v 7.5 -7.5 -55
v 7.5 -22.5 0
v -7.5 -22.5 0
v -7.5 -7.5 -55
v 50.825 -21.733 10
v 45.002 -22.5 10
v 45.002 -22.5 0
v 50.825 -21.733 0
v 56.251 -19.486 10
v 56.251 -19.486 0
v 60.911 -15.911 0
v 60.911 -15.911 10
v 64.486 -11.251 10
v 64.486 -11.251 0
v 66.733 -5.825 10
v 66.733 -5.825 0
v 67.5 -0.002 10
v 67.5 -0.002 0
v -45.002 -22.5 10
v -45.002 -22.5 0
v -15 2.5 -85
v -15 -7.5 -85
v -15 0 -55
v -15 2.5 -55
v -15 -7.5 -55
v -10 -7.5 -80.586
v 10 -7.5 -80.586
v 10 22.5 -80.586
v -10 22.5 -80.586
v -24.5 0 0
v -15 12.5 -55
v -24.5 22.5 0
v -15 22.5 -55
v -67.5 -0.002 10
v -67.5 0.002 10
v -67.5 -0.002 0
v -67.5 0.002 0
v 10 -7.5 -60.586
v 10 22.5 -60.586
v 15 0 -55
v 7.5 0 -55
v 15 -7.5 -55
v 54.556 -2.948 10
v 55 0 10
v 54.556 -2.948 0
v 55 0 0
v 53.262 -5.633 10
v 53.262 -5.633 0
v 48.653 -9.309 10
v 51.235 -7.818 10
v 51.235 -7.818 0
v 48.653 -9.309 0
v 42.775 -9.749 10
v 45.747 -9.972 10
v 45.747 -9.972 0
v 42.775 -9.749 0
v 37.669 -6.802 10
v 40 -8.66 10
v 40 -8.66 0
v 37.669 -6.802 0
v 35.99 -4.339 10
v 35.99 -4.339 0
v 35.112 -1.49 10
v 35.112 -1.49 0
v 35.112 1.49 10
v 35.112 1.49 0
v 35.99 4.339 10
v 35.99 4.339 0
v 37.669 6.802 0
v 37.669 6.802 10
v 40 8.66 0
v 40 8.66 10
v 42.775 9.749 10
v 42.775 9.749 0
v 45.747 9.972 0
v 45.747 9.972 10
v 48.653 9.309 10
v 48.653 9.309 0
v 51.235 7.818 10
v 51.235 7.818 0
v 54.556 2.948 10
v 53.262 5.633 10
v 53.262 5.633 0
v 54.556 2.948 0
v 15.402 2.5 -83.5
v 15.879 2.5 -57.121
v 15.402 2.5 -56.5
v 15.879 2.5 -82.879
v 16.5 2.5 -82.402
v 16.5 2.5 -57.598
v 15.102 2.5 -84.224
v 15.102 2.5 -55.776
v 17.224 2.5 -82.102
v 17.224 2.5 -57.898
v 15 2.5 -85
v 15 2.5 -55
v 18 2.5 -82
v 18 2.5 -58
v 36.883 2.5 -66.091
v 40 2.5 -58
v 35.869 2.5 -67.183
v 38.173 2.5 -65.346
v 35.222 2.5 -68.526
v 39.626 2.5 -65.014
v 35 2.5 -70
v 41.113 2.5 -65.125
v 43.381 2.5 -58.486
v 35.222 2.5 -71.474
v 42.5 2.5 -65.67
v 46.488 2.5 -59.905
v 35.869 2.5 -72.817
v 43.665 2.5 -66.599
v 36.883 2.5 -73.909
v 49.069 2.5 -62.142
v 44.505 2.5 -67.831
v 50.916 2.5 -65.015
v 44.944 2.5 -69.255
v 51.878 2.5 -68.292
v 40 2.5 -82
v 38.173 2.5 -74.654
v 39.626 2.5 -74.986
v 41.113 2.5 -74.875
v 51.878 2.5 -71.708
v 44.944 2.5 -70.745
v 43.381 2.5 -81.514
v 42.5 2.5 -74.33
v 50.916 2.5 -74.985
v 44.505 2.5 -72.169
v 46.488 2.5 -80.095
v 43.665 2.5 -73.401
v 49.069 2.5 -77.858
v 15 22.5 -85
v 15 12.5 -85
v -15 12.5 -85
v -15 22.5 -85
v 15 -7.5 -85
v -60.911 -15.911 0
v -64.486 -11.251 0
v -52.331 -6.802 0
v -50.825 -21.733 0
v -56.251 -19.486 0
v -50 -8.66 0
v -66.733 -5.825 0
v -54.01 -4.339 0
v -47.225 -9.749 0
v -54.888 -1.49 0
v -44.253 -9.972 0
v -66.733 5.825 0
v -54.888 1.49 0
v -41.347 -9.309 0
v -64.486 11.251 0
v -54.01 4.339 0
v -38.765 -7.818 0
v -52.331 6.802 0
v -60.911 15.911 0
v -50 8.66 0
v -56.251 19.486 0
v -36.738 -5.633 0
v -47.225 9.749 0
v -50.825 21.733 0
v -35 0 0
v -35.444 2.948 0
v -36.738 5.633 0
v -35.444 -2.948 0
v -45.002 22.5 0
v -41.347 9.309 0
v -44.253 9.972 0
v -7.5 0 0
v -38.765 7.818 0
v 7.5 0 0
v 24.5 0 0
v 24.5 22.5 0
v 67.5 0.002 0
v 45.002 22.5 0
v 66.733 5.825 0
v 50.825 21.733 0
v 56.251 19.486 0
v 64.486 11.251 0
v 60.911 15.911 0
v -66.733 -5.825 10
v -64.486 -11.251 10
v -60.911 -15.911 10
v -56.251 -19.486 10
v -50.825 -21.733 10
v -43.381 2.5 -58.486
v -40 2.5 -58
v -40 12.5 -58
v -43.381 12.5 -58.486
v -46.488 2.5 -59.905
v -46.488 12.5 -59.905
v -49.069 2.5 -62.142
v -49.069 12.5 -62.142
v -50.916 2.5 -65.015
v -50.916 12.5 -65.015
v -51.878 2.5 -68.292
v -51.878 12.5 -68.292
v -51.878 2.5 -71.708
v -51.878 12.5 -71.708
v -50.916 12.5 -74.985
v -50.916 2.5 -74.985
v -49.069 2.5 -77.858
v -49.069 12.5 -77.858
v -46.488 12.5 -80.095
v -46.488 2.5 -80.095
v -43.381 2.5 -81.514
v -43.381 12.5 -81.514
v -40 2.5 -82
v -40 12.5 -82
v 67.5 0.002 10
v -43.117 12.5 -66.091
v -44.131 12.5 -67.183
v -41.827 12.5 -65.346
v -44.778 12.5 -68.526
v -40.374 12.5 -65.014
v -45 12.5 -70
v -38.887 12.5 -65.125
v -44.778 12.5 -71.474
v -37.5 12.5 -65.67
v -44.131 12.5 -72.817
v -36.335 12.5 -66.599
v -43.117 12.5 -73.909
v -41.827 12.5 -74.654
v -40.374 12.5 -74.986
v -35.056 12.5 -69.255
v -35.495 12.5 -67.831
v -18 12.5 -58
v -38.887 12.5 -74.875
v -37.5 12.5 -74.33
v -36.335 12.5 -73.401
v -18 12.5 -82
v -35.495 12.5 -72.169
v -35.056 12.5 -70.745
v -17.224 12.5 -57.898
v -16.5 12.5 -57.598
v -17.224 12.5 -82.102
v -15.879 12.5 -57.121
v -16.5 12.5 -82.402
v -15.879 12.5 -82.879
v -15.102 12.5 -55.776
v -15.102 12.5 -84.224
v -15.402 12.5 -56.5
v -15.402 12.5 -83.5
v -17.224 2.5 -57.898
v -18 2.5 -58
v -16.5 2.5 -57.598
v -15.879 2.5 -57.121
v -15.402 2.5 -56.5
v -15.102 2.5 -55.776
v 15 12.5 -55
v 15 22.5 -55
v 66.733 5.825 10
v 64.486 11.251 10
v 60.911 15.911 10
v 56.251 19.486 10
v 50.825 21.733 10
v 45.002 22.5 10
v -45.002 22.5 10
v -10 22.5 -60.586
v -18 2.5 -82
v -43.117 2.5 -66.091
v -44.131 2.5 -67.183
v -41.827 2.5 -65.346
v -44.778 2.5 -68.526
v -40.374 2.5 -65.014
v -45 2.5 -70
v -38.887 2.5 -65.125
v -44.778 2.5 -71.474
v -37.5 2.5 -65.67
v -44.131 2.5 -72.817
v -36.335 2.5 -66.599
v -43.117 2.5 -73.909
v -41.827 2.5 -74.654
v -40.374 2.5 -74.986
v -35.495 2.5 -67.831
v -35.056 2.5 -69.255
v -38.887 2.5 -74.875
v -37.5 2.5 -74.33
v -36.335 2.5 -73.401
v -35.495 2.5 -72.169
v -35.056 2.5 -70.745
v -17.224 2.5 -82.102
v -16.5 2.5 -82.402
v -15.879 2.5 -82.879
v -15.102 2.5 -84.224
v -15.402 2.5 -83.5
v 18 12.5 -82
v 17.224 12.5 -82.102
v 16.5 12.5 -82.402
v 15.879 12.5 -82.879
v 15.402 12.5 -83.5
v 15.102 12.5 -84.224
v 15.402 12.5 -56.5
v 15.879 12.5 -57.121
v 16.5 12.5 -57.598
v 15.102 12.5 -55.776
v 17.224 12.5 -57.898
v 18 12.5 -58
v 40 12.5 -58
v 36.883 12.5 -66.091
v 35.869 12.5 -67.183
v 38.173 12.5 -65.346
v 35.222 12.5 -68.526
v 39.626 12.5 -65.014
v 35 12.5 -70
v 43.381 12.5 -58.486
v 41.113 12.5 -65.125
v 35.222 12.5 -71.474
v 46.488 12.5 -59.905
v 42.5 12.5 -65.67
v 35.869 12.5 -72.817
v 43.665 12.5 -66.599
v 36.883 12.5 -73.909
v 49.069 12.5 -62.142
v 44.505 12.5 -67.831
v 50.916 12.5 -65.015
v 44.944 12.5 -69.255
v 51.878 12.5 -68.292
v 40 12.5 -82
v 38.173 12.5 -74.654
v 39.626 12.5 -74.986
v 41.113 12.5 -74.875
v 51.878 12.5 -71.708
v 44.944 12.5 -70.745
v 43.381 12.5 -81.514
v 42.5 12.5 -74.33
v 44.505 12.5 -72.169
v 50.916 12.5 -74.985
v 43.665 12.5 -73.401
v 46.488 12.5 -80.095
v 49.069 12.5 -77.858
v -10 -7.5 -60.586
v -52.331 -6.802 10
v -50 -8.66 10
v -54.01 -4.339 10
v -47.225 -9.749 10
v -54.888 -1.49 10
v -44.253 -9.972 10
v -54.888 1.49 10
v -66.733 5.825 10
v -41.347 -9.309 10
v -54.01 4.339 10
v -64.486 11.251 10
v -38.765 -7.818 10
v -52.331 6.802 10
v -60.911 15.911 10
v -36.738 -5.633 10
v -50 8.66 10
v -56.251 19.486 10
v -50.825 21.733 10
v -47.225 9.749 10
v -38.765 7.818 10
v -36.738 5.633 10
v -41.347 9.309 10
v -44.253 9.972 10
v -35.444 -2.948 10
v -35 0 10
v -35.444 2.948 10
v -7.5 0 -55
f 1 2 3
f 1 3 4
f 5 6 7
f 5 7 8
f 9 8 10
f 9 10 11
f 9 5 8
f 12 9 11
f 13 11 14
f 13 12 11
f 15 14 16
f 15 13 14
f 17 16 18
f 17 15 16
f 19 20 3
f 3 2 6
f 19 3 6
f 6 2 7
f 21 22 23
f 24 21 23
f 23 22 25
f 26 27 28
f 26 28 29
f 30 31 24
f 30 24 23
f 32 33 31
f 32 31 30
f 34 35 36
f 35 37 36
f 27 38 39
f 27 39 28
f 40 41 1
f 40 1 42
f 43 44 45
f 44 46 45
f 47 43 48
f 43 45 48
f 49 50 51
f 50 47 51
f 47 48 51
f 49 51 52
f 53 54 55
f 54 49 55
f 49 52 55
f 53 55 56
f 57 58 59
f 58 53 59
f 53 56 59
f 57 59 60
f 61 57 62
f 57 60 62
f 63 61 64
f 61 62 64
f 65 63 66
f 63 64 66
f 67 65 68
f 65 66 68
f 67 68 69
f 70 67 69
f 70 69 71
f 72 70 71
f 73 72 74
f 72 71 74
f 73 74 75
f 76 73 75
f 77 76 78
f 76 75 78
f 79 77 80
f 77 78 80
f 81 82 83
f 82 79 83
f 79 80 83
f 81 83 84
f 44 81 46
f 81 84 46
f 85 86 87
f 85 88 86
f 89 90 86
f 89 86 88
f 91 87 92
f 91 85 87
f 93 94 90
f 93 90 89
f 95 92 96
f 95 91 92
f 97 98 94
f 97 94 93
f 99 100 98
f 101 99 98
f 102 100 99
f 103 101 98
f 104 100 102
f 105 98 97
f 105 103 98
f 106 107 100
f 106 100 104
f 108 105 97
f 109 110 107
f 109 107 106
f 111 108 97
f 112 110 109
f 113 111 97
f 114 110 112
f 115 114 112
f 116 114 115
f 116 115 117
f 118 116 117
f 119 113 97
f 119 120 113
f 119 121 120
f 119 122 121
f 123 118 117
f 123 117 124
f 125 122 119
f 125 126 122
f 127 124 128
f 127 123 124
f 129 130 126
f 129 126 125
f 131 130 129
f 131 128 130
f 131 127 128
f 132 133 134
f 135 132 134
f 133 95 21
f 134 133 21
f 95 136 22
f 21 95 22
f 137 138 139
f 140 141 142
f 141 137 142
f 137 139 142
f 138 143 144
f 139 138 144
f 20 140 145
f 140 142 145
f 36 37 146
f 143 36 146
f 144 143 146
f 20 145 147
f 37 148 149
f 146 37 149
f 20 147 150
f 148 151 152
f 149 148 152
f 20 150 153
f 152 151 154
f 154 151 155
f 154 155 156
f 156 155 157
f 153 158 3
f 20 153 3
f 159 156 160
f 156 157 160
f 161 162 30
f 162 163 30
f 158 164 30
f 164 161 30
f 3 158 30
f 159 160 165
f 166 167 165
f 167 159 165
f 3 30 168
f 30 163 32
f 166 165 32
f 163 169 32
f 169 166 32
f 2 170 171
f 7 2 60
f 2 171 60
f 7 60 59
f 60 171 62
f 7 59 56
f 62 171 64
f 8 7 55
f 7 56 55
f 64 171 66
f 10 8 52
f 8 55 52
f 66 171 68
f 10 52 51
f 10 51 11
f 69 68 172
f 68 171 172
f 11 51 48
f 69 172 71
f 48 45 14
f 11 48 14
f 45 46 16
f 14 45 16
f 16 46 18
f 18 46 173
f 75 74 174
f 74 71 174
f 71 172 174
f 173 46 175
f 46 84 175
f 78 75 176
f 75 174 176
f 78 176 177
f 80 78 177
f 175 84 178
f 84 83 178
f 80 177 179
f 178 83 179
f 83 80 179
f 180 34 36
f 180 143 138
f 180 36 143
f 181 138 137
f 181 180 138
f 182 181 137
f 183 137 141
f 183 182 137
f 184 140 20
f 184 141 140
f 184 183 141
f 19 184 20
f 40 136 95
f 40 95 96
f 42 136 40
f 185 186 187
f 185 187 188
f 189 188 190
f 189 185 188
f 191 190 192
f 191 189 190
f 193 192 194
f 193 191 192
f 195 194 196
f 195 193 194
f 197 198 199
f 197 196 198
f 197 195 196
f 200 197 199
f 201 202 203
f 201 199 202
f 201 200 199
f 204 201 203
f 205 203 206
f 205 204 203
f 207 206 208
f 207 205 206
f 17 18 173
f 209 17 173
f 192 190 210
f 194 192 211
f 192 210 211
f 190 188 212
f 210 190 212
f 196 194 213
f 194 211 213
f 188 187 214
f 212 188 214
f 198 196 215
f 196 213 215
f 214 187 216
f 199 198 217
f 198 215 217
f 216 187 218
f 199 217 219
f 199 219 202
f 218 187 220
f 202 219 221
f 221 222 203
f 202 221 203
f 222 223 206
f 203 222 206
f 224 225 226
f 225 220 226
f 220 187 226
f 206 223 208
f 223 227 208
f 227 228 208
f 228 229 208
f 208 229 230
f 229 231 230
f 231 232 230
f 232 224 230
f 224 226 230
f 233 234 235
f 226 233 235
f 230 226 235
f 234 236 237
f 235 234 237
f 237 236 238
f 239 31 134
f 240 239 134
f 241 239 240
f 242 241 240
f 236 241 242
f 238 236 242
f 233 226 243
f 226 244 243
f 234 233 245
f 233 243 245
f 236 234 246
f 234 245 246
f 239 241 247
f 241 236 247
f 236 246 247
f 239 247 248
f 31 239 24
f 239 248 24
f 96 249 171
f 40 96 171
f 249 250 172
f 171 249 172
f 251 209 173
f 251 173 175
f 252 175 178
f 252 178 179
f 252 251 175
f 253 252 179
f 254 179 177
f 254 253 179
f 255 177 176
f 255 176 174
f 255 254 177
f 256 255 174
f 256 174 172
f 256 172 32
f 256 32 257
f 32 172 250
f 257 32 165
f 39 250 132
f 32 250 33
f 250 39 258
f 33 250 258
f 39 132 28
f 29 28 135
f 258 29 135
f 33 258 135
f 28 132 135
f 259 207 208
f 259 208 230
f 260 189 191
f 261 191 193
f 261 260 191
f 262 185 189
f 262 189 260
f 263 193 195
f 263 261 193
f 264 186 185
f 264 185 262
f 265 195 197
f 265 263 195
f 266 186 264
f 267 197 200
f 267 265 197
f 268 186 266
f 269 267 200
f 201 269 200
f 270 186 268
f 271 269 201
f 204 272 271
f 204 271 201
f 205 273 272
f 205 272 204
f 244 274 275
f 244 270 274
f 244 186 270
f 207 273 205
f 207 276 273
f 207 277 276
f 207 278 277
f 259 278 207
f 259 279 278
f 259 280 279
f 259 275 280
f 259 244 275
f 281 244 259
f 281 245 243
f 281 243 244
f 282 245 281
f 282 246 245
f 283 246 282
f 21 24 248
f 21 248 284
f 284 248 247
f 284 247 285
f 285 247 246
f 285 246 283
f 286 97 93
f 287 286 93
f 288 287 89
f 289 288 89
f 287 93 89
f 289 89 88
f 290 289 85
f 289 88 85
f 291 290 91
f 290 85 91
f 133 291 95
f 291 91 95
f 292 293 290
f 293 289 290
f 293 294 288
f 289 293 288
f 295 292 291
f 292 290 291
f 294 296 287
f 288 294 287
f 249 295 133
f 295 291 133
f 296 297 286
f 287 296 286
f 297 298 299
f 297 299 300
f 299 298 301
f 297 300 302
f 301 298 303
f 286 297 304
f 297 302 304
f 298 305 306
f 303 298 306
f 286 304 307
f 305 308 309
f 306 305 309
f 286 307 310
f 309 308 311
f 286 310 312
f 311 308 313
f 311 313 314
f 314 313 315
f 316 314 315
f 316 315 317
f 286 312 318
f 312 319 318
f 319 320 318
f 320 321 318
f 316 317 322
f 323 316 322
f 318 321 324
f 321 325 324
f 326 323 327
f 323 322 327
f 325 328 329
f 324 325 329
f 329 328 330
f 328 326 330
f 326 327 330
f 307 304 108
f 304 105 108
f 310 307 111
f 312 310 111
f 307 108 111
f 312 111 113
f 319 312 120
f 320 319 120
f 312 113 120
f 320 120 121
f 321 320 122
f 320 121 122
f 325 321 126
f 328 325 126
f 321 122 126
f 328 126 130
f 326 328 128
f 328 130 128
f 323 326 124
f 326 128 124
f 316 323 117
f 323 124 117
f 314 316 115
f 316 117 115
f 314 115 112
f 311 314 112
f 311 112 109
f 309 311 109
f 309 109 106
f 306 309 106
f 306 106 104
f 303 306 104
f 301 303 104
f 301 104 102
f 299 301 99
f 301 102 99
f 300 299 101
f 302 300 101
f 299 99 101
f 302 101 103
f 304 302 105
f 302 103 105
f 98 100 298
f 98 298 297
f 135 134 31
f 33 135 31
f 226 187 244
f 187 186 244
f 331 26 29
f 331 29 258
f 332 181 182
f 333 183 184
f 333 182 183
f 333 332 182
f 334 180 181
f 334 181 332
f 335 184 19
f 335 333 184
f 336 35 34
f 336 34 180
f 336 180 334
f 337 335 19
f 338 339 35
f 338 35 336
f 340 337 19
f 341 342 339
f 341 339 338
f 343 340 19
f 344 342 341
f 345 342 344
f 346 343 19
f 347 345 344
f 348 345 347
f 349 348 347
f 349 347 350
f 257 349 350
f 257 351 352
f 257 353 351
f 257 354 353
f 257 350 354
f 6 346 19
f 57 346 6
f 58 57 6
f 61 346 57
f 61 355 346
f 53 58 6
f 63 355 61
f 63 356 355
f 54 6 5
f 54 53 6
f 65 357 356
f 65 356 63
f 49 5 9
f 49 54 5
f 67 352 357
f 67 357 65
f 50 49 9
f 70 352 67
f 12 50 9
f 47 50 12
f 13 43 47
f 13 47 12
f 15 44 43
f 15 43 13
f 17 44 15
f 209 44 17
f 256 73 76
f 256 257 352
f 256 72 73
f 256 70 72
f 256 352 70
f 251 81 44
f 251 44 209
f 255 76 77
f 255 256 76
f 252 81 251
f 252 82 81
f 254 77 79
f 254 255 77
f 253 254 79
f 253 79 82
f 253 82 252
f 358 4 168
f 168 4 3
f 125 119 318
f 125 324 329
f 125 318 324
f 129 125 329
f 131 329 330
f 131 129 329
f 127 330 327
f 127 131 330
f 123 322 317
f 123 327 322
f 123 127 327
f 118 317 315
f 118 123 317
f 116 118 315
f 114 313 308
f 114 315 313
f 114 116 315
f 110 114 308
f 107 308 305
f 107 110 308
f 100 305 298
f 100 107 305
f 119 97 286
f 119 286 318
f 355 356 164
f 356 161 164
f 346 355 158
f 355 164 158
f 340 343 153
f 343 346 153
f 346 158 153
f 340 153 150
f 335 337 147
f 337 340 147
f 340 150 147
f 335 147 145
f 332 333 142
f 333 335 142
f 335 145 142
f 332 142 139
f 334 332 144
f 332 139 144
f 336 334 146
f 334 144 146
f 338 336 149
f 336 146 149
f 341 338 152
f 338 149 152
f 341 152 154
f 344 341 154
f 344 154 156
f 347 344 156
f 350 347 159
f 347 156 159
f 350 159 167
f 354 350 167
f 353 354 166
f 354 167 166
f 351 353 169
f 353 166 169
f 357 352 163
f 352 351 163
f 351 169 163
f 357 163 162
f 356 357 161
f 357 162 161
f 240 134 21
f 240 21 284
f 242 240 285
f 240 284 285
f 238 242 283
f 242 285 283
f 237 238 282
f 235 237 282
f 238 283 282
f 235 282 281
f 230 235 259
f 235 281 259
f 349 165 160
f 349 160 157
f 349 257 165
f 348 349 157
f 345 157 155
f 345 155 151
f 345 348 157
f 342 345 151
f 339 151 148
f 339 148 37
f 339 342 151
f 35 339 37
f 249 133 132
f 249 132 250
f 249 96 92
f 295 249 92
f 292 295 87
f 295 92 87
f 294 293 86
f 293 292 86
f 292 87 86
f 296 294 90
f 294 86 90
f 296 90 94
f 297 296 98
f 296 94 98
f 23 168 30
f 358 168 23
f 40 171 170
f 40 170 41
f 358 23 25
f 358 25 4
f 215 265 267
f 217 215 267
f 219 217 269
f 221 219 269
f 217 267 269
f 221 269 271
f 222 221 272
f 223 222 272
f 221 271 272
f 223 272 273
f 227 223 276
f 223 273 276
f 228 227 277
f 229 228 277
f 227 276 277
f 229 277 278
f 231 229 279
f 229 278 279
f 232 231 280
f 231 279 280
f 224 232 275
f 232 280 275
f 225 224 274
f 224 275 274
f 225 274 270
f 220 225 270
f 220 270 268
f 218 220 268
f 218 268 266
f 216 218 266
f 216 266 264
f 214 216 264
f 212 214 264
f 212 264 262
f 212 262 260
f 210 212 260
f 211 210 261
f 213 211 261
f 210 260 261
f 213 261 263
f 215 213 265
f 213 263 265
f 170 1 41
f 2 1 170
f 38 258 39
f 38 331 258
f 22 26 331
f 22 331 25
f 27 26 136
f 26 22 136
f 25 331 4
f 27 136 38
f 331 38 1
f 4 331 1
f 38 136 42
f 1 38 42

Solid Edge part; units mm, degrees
sketch "Sketch1" plane through (0, 0, 0) normal (0, 0, 1) x (1, 0, 0)
  line L0 (-67.5, -22.5) -> (67.5, -22.5)
  line L1 (67.5, -22.5) -> (67.5, 22.5)
  line L2 (67.5, 22.5) -> (-67.5, 22.5)
  line L3 (-67.5, 22.5) -> (-67.5, -22.5)
  circle A0 centre (-45, 0) radius 10
  circle A1 centre (45, 0) radius 10
  dimension "D1" = 135
  dimension "D2" = 45
  dimension "D3" = 20
  dimension "D4" = 20
  dimension "D5" = 22.5
  dimension "D6" = 22.5
extrude "Protrusion1" add sketch "Sketch1" along normal blind 10
fillet "Round_1" radius 22.5 4 edges at (67.5, -22.5, 5) (67.5, 22.5, 5) (-67.5, -22.5, 5) (-67.5, 22.5, 5)
sketch "Sketch2" plane through (0, 22.5, 5) normal (0, 1, 0) x (1, 0, 0)
  line L0 (-15, 60) -> (15, 60)
  line L1 (15, 60) -> (24.5, 5)
  line L2 (-24.5, 5) -> (24.5, 5)
  line L3 (-15, 60) -> (-24.5, 5)
extrude "ExtrudedProtrusion_2" add sketch "Sketch2" against normal blind 22.5
sketch "Sketch3" plane through (0, 10, 0) normal (0, -1, 0) x (1, 0, 0)
  line L0 (15, -85) -> (-15, -85)
  line L1 (-15, -85) -> (-15, -55)
  line L2 (-15, -55) -> (15, -55)
  line L3 (15, -85) -> (15, -55)
  line L4 (10, -60.5862) -> (10, -80.5862)
  line L5 (10, -80.5862) -> (-10, -80.5862)
  line L6 (-10, -80.5862) -> (-10, -60.5862)
  line L7 (-10, -60.5862) -> (10, -60.5862)
extrude "ExtrudedProtrusion_4" add sketch "Sketch3" against normal blind 12.5
sketch "Sketch4" plane through (0, 10, 0) normal (0, -1, 0) x (1, 0, 0)
  line L0 (15, -55) -> (15, -85)
  line L1 (15, -85) -> (-15, -85)
  line L2 (-15, -85) -> (-15, -55)
  line L3 (-15, -55) -> (15, -55)
  line L4 (10, -80.5862) -> (-10, -80.5862)
  line L5 (-10, -80.5862) -> (-10, -60.5862)
  line L6 (-10, -60.5862) -> (10, -60.5862)
  line L7 (10, -60.5862) -> (10, -80.5862)
extrude "ExtrudedProtrusion_5" add sketch "Sketch4" along normal blind 17.5
sketch "Sketch5" plane through (0, 2.5, -70) normal (0, -1, 0) x (-1, 0, 0)
  line L0 (-18, 12) -> (-40, 12)
  line L1 (-40, -12) -> (-18, -12)
  arc A0 (-18, -12) -> (-15, -15) centre (-18, -15) cw
  line L2 (-15, 15) -> (-15, -15)
  arc A1 (-18, 12) -> (-15, 15) centre (-18, 15) ccw
  arc A2 (-40, -12) -> (-40, 12) centre (-40, 0) cw
  circle A3 centre (-40, 0) radius 5
  line L3 (40, 12) -> (18, 12)
  arc A4 (15, 15) -> (18, 12) centre (18, 15) ccw
  line L4 (15, 15) -> (15, -15)
  arc A5 (15, -15) -> (18, -12) centre (18, -15) cw
  line L5 (40, -12) -> (18, -12)
  arc A6 (40, 12) -> (40, -12) centre (40, 0) cw
  circle A7 centre (40, 0) radius 5
extrude "ExtrudedProtrusion_7" add sketch "Sketch5" against normal blind 10
sketch "Sketch6" plane through (7.5, 0, 0) normal (1, 0, 0) x (0, 1, 0)
  line L0 (0, 0) -> (-22.5, 0)
  line L1 (-22.5, 0) -> (-7.5, -55)
  line L2 (-7.5, -55) -> (0, -55)
  line L3 (0, -55) -> (0, 0)
extrude "ExtrudedProtrusion_8" add sketch "Sketch6" against normal blind 15
